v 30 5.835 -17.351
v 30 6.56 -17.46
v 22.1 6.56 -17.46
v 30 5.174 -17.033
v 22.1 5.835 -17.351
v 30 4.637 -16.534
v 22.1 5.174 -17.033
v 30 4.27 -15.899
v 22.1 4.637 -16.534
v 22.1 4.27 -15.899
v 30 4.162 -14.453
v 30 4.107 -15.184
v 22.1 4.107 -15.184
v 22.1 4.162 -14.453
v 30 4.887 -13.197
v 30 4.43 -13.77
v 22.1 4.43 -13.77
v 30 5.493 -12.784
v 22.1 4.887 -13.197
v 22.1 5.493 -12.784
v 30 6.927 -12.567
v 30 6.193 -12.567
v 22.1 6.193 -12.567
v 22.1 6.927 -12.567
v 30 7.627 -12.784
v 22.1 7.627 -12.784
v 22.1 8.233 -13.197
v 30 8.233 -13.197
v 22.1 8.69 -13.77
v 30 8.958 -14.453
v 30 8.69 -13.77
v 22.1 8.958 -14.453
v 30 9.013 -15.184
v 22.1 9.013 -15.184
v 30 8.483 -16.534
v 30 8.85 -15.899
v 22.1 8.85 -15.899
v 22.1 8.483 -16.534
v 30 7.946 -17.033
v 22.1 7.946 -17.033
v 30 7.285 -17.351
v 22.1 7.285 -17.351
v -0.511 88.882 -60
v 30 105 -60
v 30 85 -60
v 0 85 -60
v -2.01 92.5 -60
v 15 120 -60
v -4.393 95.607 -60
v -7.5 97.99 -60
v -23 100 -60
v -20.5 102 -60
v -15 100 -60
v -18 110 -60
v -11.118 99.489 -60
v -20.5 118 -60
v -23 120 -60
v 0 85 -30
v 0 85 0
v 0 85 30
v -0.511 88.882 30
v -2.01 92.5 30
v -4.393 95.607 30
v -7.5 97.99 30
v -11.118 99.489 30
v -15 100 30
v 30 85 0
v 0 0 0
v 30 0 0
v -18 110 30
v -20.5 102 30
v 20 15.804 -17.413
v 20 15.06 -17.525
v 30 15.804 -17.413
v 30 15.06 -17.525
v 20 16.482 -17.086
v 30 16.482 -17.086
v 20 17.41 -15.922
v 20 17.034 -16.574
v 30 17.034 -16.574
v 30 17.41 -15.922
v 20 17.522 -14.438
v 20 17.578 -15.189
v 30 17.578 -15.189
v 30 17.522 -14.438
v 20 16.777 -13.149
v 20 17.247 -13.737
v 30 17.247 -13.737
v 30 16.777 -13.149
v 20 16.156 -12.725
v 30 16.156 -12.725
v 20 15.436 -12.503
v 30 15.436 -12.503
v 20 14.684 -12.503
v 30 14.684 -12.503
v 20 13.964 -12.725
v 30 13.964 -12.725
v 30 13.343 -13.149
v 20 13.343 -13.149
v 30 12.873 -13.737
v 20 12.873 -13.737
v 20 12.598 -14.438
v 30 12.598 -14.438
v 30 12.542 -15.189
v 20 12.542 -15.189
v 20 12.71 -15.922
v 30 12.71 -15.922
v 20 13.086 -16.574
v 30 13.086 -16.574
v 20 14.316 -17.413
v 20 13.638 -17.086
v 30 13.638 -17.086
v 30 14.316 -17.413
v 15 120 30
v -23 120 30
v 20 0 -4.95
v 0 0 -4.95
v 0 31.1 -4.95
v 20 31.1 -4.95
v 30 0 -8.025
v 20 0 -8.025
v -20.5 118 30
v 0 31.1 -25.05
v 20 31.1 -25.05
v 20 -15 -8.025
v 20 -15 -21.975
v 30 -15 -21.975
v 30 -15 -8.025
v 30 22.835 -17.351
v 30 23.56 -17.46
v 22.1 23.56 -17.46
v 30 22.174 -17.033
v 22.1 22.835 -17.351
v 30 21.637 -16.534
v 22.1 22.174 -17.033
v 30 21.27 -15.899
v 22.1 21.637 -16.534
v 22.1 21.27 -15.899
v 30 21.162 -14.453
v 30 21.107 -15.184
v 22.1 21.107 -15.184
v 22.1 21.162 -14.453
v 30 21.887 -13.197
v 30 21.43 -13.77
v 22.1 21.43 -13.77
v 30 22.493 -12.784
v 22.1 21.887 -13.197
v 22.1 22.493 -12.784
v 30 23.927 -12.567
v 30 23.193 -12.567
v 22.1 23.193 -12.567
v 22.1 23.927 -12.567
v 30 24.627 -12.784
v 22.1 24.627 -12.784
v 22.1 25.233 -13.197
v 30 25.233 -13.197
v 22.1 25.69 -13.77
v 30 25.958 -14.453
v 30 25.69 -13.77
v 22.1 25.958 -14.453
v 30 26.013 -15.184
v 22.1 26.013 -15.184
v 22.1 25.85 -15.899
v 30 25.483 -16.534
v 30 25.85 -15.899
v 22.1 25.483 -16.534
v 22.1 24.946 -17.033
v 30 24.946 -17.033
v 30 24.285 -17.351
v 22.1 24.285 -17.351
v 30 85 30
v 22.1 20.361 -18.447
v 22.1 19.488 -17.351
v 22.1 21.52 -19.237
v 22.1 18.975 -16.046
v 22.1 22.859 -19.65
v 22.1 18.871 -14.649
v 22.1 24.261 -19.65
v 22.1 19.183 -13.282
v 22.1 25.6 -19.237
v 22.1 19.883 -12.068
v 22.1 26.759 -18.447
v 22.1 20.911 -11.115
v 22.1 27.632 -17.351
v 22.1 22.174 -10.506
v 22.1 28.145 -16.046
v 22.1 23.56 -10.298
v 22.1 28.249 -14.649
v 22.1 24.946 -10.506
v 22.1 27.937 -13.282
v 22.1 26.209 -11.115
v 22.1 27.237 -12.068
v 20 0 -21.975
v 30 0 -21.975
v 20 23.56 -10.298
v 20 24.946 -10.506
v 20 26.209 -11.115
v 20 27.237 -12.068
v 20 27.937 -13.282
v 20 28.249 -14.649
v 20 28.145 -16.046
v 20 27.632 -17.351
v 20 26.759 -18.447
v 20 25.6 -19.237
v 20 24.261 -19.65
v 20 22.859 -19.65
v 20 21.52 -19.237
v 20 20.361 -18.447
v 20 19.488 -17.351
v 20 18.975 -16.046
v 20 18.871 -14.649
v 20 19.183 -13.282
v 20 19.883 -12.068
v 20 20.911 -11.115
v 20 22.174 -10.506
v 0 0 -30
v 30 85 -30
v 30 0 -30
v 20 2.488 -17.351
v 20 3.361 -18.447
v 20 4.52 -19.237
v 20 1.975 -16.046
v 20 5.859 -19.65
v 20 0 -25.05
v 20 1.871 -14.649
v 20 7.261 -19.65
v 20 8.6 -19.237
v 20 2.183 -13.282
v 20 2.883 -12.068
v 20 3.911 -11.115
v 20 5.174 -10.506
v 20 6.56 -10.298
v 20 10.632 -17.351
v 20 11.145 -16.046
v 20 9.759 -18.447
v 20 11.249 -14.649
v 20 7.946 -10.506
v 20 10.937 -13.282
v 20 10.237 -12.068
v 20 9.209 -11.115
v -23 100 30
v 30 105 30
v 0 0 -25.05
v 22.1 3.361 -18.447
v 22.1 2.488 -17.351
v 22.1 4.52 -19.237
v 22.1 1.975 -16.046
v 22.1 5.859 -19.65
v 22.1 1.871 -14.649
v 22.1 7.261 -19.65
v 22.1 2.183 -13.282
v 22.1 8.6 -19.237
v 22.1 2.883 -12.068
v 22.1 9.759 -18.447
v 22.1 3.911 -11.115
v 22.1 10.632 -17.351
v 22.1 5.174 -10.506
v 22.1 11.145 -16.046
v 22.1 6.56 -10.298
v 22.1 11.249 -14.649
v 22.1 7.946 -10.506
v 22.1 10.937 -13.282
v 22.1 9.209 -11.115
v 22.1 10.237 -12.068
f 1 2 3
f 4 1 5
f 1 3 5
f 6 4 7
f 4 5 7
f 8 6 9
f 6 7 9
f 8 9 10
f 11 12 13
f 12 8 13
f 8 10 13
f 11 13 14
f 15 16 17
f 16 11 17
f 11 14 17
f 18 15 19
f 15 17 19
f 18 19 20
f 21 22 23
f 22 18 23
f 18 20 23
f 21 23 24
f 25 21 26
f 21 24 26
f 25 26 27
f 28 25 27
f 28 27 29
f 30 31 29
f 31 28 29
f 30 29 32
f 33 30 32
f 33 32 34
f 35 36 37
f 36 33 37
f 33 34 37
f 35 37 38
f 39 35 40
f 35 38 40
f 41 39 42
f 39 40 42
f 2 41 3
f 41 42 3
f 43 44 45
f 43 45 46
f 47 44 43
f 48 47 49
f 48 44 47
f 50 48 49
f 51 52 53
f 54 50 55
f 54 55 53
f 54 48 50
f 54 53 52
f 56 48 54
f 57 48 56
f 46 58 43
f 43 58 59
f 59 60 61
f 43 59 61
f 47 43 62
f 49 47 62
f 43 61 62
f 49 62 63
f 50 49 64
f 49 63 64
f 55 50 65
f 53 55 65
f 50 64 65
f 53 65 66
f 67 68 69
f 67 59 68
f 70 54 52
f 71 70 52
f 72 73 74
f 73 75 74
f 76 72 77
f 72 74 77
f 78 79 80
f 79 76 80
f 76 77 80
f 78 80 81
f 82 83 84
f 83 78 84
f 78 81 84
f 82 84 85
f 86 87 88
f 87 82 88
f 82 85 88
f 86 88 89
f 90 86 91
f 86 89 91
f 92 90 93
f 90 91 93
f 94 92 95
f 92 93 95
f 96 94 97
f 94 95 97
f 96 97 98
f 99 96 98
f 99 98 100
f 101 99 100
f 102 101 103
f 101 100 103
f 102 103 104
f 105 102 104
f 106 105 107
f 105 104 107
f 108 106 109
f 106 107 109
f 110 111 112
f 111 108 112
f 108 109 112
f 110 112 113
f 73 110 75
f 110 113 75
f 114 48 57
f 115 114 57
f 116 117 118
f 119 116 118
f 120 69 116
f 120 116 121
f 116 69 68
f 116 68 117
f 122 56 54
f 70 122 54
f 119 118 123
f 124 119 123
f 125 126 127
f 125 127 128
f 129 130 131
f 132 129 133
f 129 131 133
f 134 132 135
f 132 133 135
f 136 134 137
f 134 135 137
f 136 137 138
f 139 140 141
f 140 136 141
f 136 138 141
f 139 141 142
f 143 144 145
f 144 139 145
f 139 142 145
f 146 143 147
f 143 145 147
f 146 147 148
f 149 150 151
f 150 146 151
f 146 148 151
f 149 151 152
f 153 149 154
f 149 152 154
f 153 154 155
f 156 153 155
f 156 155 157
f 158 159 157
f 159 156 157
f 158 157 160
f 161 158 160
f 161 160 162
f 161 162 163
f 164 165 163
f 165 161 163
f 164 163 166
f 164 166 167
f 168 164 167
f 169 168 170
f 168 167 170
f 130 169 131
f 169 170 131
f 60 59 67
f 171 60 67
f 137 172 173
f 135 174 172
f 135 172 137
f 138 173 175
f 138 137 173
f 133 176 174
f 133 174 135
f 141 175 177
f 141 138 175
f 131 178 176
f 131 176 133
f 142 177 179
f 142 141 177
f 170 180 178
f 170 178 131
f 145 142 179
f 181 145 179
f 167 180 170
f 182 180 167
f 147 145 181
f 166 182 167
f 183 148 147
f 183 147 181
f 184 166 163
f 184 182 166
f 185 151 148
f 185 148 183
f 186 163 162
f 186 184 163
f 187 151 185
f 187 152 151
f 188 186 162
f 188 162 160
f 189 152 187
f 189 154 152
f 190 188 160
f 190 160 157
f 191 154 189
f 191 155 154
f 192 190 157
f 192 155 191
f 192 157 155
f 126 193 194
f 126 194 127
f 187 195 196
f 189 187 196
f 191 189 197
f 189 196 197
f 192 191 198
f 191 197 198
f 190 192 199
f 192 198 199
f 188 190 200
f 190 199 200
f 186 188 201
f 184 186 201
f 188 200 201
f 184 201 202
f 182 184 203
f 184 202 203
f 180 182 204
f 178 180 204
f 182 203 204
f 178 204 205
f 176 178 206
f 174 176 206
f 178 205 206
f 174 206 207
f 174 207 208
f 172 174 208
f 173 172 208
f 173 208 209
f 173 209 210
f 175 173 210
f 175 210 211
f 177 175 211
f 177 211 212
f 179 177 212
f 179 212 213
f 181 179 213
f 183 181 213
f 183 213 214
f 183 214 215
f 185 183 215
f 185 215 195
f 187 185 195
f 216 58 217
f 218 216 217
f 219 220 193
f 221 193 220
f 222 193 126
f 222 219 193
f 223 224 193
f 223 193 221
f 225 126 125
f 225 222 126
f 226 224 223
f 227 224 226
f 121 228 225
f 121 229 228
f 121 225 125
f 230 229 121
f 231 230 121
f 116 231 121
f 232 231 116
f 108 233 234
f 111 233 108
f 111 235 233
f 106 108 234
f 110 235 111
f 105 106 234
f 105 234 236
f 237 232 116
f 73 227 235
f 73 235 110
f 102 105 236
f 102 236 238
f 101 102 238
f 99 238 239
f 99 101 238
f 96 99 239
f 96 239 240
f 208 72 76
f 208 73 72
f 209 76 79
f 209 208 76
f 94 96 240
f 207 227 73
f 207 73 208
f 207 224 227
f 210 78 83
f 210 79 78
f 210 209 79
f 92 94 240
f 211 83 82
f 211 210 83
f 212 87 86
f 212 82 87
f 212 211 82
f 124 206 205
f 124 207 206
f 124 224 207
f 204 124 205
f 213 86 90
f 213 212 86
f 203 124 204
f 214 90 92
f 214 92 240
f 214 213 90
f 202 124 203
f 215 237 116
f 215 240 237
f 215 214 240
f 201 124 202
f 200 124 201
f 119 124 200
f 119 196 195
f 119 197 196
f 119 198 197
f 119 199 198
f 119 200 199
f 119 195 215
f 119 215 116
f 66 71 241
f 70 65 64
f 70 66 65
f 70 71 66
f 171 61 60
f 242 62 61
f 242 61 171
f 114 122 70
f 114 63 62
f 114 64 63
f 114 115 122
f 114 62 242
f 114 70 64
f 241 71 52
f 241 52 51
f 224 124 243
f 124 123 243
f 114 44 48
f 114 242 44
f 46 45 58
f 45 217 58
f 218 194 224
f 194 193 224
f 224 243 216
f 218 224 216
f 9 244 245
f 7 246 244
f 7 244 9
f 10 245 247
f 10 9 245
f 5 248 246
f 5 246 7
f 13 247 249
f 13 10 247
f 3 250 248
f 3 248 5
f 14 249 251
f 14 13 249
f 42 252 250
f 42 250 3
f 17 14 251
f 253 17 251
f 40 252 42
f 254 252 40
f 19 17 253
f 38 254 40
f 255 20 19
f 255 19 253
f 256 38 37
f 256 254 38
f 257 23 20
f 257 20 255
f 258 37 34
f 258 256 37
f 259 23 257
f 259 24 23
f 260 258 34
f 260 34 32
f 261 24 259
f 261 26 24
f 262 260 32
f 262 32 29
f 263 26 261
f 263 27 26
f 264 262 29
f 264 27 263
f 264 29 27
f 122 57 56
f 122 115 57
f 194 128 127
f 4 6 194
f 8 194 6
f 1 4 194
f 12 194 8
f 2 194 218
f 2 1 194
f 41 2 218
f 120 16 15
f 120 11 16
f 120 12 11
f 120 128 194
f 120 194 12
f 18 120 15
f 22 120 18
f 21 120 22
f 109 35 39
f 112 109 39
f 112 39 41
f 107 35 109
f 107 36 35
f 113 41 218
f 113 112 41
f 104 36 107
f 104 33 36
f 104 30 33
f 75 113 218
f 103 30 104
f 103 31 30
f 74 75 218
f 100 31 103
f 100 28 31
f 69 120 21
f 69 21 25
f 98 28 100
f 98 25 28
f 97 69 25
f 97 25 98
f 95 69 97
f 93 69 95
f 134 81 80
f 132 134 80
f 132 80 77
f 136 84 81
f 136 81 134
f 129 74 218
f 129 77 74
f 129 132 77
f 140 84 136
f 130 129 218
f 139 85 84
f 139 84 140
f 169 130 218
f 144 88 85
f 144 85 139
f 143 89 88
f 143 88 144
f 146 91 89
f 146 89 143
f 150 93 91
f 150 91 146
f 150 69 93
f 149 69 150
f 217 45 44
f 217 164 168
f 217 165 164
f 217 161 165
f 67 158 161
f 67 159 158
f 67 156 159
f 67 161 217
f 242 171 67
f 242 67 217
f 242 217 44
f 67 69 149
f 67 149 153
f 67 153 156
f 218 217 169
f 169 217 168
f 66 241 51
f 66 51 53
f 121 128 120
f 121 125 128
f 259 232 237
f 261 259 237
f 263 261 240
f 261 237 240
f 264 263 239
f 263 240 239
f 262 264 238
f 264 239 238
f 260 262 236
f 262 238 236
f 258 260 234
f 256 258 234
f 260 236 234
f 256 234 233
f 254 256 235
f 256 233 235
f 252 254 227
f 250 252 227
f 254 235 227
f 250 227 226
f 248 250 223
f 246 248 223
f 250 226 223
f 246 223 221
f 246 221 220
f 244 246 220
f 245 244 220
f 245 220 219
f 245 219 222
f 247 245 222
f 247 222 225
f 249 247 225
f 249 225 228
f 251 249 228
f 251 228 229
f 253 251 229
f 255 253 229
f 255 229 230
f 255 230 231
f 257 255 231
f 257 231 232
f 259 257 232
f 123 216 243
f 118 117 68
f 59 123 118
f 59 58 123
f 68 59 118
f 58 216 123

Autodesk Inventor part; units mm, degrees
ref_plane "YZ Plane" through (0, 0, 0) normal (1, 0, 0) x (0, 1, 0)
ref_plane "XZ Plane" through (0, 0, 0) normal (0, 1, 0) x (-1, 0, 0)
sketch "Sketch1" plane through (0, 0, 0) normal (0, 0, 1) x (1, 0, 0)
  line L0 (0, 0) -> (25, 0)
  line L1 (25, 0) -> (25, 40)
  line L2 (25, 40) -> (0, 40)
  line L3 (0, 40) -> (0, 0)
  dimension "d1" = 25
  dimension "d2" = 40
  dimension "d3" = 25
extrude "Extrusion1" add sketch "Sketch1" against normal blind 30
sketch "Sketch2" plane through (25, 0, 0) normal (1, 0, 0) x (0, 0, -1)
  line L0 (0, 0) -> (30, 0) projected
  circle A0 centre (15, 6.56) radius 2.46
extrude "Extrusion2" cut sketch "Sketch2" against normal blind 30
sketch "Sketch3" plane through (0, 0, 0) normal (-1, 0, 0) x (0, 0, 1)
  line L0 (0, 0) -> (-30, 0) projected
  line L1 (-25.05, 0) -> (-4.95, 0)
  line L2 (-4.95, 0) -> (-4.95, 33.12)
  line L3 (-4.95, 33.12) -> (-25.05, 33.12)
  line L4 (-25.05, 33.12) -> (-25.05, 0)
  dimension "d11" = 20.1
extrude "Extrusion3" cut sketch "Sketch3" against normal blind 20
sketch "Sketch4" plane through (0, 0, 0) normal (0, -1, 0) x (1, 0, 0)
  line L0 (20, -4.95) -> (20, -25.05) projected
  line L1 (20, -15) -> (25, -15)
  line L2 (25, 0) -> (25, -30) projected
  line L3 (20, -8.025) -> (25, -8.025)
  line L4 (25, -8.025) -> (25, -21.975)
  line L5 (25, -21.975) -> (20, -21.975)
  line L6 (20, -21.975) -> (20, -8.025)
  line L7 (20, -8.025) -> (25, -21.975) construction
  line L8 (25, -8.025) -> (20, -21.975) construction
  line L9 (25, -12.54) -> (25, -17.46) projected
  point P0 (0, 0)
  point P1 (22.5, -15)
  dimension "d14" = 13.95
extrude "Extrusion4" add sketch "Sketch4" along normal blind 15
sketch "Sketch5" plane through (20, 0, 0) normal (-1, 0, 0) x (0, 0, 1)
  circle A0 centre (-15, 6.56) radius 2.46 projected
  circle A1 centre (-15, 6.56) radius 4.7025
  circle A2 centre (-15, 6.56) radius 2.46 projected
  circle A3 centre (-15, 6.56) radius 2.46
  point P0 (0, 0)
  dimension "d17" = 9.405
extrude "Extrusion5" cut sketch "Sketch5" against normal blind 2.1
sketch "Sketch6" plane through (25, 0, 0) normal (1, 0, 0) x (0, 0, -1)
  circle A0 centre (15, 6.56) radius 4.7025 projected
  line L0 (15, 6.56) -> (15, 23.56)
  circle A1 centre (15, 23.56) radius 2.46
  point P0 (0, 0)
  dimension "d20" = 17
  dimension "d21" = 4.92
extrude "Extrusion6" cut sketch "Sketch6" against normal blind 10 contours A1
sketch "Sketch7" plane through (20, 0, 0) normal (-1, 0, 0) x (0, 0, 1)
  circle A0 centre (-15, 23.56) radius 2.46 projected
  circle A1 centre (-15, 23.56) radius 4.7025
  point P0 (0, 0)
  dimension "d24" = 9.405
extrude "Extrusion7" cut sketch "Sketch7" against normal blind 2.1
sketch "Sketch9" plane through (25, 0, 0) normal (1, 0, 0) x (0, 0, -1)
  circle A0 centre (15, 6.56) radius 2.46 projected
  circle A1 centre (15, 6.56) radius 2.46
  circle A2 centre (15, 23.56) radius 2.46 projected
  circle A3 centre (15, 23.56) radius 2.46
  line L0 (30, 40) -> (30, 0) projected
  line L1 (30, 0) -> (30, 40)
  line L2 (30, 40) -> (0, 40)
  line L3 (0, 40) -> (0, 0)
  line L4 (0, 0) -> (8.025, 0) projected
  line L5 (21.975, 0) -> (21.975, -15)
  line L6 (21.975, -15) -> (8.025, -15)
  line L7 (8.025, -15) -> (8.025, 0)
  line L8 (0, 0) -> (8.025, 0)
  line L9 (21.975, 0) -> (30, 0)
extrude "Extrusion8" add sketch "Sketch9" along normal blind 5
sketch "Sketch10" plane through (0, 40, 0) normal (0, 1, 0) x (1, 0, 0)
  line L0 (0, 30) -> (30, 30) projected
  line L1 (30, 0) -> (0, 0) projected
  line L2 (0, 30) -> (30, 30)
  line L3 (30, 30) -> (30, 0)
  line L4 (30, 0) -> (0, 0)
  line L5 (0, 0) -> (0, 30)
extrude "Extrusion9" add sketch "Sketch10" along normal blind 30
sketch "Sketch12" plane through (30, 0, 0) normal (1, 0, 0) x (0, 0, -1)
  circle A0 centre (15, 6.56) radius 2.46 projected
  line L0 (15, 6.56) -> (15, 15.06)
  circle A1 centre (15, 15.06) radius 2.525
  point P0 (0, 0)
  dimension "d31" = 8.5
  dimension "d33" = 5.05
extrude "Extrusion10" cut sketch "Sketch12" against normal blind 30 contours A1
sketch "Sketch14" plane through (0, 0, 0) normal (0, 0, 1) x (1, 0, 0)
  line L0 (30, 70) -> (0, 70) projected
  line L1 (0, 70) -> (0, 85)
  line L2 (-15, 100) -> (-23, 100)
  line L3 (30, 0) -> (30, 70) projected
  line L4 (30, 100) -> (30, 70)
  arc A0 (0, 85) -> (-15, 100) centre (-15, 85) ccw
  line L5 (-23, 120) -> (15, 120)
  line L6 (-20.5, 118) -> (-18, 110)
  line L7 (-20.5, 118) -> (-23, 120)
  line L8 (-20.5, 102) -> (-18, 110)
  line L9 (-20.5, 102) -> (-23, 100)
  line L10 (30, 105) -> (15, 120)
  line L11 (30, 105) -> (30, 100)
  point P0 (0, 0)
  point P1 (0, 100)
  dimension "d47" = 30
  dimension "d54" = 15
  dimension "d60" = 20
extrude "Extrusion12" add sketch "Sketch14" against normal blind 30
sketch "Sketch15" plane through (0, 0, -25.05) normal (-1, 0, 0) x (0, 0, 1)
  line L0 (0, 33.12) -> (20.1, 33.12) projected
  line L1 (20.1, 33.12) -> (20.1, 0) projected
  line L2 (0, 33.12) -> (20.1, 33.12)
  line L3 (20.1, 33.12) -> (20.1, 31.1)
  line L4 (20.1, 31.1) -> (0, 31.1)
  line L5 (0, 31.1) -> (0, 33.12)
  point P0 (25.05, 0)
  dimension "d57" = 2.02
extrude "Extrusion13" add sketch "Sketch15" against normal blind 20
sketch "Sketch19" plane through (0, 0, 0) normal (0, 0, 1) x (1, 0, 0)
  arc A0 (0, 85) -> (-15, 100) centre (-15, 85) ccw projected
  arc A1 (0, 85) -> (-15, 100) centre (-15, 85) ccw
  line L0 (-15, 100) -> (-23, 100) projected
  line L1 (-15, 100) -> (-23, 100)
  line L2 (-23, 100) -> (-20.5, 102) projected
  line L3 (-23, 100) -> (-20.5, 102)
  line L4 (-20.5, 102) -> (-18, 110) projected
  line L5 (-20.5, 102) -> (-18, 110)
  line L6 (-18, 110) -> (-20.5, 118) projected
  line L7 (-18, 110) -> (-20.5, 118)
  line L8 (-23, 120) -> (15, 120) projected
  line L9 (-20.5, 118) -> (-23, 120)
  line L10 (-23, 120) -> (15, 120)
  line L11 (15, 120) -> (30, 105) projected
  line L12 (15, 120) -> (30, 105)
  line L13 (30, 105) -> (30, 85)
  line L14 (30, 0) -> (30, 105) projected
  line L15 (0, 85) -> (30, 85)
  point P0 (0, 0)
extrude "Extrusion14" add sketch "Sketch19" along normal blind 30
ref_plane "Work Plane1" through (0, 0, -15) normal (0, 0, 1) x (1, 0, 0)
mirror "Mirror1" about plane through (0, 0, -15) normal (0, 0, 1) of "Extrusion14"
properties part number "16mm_x_90mm"
